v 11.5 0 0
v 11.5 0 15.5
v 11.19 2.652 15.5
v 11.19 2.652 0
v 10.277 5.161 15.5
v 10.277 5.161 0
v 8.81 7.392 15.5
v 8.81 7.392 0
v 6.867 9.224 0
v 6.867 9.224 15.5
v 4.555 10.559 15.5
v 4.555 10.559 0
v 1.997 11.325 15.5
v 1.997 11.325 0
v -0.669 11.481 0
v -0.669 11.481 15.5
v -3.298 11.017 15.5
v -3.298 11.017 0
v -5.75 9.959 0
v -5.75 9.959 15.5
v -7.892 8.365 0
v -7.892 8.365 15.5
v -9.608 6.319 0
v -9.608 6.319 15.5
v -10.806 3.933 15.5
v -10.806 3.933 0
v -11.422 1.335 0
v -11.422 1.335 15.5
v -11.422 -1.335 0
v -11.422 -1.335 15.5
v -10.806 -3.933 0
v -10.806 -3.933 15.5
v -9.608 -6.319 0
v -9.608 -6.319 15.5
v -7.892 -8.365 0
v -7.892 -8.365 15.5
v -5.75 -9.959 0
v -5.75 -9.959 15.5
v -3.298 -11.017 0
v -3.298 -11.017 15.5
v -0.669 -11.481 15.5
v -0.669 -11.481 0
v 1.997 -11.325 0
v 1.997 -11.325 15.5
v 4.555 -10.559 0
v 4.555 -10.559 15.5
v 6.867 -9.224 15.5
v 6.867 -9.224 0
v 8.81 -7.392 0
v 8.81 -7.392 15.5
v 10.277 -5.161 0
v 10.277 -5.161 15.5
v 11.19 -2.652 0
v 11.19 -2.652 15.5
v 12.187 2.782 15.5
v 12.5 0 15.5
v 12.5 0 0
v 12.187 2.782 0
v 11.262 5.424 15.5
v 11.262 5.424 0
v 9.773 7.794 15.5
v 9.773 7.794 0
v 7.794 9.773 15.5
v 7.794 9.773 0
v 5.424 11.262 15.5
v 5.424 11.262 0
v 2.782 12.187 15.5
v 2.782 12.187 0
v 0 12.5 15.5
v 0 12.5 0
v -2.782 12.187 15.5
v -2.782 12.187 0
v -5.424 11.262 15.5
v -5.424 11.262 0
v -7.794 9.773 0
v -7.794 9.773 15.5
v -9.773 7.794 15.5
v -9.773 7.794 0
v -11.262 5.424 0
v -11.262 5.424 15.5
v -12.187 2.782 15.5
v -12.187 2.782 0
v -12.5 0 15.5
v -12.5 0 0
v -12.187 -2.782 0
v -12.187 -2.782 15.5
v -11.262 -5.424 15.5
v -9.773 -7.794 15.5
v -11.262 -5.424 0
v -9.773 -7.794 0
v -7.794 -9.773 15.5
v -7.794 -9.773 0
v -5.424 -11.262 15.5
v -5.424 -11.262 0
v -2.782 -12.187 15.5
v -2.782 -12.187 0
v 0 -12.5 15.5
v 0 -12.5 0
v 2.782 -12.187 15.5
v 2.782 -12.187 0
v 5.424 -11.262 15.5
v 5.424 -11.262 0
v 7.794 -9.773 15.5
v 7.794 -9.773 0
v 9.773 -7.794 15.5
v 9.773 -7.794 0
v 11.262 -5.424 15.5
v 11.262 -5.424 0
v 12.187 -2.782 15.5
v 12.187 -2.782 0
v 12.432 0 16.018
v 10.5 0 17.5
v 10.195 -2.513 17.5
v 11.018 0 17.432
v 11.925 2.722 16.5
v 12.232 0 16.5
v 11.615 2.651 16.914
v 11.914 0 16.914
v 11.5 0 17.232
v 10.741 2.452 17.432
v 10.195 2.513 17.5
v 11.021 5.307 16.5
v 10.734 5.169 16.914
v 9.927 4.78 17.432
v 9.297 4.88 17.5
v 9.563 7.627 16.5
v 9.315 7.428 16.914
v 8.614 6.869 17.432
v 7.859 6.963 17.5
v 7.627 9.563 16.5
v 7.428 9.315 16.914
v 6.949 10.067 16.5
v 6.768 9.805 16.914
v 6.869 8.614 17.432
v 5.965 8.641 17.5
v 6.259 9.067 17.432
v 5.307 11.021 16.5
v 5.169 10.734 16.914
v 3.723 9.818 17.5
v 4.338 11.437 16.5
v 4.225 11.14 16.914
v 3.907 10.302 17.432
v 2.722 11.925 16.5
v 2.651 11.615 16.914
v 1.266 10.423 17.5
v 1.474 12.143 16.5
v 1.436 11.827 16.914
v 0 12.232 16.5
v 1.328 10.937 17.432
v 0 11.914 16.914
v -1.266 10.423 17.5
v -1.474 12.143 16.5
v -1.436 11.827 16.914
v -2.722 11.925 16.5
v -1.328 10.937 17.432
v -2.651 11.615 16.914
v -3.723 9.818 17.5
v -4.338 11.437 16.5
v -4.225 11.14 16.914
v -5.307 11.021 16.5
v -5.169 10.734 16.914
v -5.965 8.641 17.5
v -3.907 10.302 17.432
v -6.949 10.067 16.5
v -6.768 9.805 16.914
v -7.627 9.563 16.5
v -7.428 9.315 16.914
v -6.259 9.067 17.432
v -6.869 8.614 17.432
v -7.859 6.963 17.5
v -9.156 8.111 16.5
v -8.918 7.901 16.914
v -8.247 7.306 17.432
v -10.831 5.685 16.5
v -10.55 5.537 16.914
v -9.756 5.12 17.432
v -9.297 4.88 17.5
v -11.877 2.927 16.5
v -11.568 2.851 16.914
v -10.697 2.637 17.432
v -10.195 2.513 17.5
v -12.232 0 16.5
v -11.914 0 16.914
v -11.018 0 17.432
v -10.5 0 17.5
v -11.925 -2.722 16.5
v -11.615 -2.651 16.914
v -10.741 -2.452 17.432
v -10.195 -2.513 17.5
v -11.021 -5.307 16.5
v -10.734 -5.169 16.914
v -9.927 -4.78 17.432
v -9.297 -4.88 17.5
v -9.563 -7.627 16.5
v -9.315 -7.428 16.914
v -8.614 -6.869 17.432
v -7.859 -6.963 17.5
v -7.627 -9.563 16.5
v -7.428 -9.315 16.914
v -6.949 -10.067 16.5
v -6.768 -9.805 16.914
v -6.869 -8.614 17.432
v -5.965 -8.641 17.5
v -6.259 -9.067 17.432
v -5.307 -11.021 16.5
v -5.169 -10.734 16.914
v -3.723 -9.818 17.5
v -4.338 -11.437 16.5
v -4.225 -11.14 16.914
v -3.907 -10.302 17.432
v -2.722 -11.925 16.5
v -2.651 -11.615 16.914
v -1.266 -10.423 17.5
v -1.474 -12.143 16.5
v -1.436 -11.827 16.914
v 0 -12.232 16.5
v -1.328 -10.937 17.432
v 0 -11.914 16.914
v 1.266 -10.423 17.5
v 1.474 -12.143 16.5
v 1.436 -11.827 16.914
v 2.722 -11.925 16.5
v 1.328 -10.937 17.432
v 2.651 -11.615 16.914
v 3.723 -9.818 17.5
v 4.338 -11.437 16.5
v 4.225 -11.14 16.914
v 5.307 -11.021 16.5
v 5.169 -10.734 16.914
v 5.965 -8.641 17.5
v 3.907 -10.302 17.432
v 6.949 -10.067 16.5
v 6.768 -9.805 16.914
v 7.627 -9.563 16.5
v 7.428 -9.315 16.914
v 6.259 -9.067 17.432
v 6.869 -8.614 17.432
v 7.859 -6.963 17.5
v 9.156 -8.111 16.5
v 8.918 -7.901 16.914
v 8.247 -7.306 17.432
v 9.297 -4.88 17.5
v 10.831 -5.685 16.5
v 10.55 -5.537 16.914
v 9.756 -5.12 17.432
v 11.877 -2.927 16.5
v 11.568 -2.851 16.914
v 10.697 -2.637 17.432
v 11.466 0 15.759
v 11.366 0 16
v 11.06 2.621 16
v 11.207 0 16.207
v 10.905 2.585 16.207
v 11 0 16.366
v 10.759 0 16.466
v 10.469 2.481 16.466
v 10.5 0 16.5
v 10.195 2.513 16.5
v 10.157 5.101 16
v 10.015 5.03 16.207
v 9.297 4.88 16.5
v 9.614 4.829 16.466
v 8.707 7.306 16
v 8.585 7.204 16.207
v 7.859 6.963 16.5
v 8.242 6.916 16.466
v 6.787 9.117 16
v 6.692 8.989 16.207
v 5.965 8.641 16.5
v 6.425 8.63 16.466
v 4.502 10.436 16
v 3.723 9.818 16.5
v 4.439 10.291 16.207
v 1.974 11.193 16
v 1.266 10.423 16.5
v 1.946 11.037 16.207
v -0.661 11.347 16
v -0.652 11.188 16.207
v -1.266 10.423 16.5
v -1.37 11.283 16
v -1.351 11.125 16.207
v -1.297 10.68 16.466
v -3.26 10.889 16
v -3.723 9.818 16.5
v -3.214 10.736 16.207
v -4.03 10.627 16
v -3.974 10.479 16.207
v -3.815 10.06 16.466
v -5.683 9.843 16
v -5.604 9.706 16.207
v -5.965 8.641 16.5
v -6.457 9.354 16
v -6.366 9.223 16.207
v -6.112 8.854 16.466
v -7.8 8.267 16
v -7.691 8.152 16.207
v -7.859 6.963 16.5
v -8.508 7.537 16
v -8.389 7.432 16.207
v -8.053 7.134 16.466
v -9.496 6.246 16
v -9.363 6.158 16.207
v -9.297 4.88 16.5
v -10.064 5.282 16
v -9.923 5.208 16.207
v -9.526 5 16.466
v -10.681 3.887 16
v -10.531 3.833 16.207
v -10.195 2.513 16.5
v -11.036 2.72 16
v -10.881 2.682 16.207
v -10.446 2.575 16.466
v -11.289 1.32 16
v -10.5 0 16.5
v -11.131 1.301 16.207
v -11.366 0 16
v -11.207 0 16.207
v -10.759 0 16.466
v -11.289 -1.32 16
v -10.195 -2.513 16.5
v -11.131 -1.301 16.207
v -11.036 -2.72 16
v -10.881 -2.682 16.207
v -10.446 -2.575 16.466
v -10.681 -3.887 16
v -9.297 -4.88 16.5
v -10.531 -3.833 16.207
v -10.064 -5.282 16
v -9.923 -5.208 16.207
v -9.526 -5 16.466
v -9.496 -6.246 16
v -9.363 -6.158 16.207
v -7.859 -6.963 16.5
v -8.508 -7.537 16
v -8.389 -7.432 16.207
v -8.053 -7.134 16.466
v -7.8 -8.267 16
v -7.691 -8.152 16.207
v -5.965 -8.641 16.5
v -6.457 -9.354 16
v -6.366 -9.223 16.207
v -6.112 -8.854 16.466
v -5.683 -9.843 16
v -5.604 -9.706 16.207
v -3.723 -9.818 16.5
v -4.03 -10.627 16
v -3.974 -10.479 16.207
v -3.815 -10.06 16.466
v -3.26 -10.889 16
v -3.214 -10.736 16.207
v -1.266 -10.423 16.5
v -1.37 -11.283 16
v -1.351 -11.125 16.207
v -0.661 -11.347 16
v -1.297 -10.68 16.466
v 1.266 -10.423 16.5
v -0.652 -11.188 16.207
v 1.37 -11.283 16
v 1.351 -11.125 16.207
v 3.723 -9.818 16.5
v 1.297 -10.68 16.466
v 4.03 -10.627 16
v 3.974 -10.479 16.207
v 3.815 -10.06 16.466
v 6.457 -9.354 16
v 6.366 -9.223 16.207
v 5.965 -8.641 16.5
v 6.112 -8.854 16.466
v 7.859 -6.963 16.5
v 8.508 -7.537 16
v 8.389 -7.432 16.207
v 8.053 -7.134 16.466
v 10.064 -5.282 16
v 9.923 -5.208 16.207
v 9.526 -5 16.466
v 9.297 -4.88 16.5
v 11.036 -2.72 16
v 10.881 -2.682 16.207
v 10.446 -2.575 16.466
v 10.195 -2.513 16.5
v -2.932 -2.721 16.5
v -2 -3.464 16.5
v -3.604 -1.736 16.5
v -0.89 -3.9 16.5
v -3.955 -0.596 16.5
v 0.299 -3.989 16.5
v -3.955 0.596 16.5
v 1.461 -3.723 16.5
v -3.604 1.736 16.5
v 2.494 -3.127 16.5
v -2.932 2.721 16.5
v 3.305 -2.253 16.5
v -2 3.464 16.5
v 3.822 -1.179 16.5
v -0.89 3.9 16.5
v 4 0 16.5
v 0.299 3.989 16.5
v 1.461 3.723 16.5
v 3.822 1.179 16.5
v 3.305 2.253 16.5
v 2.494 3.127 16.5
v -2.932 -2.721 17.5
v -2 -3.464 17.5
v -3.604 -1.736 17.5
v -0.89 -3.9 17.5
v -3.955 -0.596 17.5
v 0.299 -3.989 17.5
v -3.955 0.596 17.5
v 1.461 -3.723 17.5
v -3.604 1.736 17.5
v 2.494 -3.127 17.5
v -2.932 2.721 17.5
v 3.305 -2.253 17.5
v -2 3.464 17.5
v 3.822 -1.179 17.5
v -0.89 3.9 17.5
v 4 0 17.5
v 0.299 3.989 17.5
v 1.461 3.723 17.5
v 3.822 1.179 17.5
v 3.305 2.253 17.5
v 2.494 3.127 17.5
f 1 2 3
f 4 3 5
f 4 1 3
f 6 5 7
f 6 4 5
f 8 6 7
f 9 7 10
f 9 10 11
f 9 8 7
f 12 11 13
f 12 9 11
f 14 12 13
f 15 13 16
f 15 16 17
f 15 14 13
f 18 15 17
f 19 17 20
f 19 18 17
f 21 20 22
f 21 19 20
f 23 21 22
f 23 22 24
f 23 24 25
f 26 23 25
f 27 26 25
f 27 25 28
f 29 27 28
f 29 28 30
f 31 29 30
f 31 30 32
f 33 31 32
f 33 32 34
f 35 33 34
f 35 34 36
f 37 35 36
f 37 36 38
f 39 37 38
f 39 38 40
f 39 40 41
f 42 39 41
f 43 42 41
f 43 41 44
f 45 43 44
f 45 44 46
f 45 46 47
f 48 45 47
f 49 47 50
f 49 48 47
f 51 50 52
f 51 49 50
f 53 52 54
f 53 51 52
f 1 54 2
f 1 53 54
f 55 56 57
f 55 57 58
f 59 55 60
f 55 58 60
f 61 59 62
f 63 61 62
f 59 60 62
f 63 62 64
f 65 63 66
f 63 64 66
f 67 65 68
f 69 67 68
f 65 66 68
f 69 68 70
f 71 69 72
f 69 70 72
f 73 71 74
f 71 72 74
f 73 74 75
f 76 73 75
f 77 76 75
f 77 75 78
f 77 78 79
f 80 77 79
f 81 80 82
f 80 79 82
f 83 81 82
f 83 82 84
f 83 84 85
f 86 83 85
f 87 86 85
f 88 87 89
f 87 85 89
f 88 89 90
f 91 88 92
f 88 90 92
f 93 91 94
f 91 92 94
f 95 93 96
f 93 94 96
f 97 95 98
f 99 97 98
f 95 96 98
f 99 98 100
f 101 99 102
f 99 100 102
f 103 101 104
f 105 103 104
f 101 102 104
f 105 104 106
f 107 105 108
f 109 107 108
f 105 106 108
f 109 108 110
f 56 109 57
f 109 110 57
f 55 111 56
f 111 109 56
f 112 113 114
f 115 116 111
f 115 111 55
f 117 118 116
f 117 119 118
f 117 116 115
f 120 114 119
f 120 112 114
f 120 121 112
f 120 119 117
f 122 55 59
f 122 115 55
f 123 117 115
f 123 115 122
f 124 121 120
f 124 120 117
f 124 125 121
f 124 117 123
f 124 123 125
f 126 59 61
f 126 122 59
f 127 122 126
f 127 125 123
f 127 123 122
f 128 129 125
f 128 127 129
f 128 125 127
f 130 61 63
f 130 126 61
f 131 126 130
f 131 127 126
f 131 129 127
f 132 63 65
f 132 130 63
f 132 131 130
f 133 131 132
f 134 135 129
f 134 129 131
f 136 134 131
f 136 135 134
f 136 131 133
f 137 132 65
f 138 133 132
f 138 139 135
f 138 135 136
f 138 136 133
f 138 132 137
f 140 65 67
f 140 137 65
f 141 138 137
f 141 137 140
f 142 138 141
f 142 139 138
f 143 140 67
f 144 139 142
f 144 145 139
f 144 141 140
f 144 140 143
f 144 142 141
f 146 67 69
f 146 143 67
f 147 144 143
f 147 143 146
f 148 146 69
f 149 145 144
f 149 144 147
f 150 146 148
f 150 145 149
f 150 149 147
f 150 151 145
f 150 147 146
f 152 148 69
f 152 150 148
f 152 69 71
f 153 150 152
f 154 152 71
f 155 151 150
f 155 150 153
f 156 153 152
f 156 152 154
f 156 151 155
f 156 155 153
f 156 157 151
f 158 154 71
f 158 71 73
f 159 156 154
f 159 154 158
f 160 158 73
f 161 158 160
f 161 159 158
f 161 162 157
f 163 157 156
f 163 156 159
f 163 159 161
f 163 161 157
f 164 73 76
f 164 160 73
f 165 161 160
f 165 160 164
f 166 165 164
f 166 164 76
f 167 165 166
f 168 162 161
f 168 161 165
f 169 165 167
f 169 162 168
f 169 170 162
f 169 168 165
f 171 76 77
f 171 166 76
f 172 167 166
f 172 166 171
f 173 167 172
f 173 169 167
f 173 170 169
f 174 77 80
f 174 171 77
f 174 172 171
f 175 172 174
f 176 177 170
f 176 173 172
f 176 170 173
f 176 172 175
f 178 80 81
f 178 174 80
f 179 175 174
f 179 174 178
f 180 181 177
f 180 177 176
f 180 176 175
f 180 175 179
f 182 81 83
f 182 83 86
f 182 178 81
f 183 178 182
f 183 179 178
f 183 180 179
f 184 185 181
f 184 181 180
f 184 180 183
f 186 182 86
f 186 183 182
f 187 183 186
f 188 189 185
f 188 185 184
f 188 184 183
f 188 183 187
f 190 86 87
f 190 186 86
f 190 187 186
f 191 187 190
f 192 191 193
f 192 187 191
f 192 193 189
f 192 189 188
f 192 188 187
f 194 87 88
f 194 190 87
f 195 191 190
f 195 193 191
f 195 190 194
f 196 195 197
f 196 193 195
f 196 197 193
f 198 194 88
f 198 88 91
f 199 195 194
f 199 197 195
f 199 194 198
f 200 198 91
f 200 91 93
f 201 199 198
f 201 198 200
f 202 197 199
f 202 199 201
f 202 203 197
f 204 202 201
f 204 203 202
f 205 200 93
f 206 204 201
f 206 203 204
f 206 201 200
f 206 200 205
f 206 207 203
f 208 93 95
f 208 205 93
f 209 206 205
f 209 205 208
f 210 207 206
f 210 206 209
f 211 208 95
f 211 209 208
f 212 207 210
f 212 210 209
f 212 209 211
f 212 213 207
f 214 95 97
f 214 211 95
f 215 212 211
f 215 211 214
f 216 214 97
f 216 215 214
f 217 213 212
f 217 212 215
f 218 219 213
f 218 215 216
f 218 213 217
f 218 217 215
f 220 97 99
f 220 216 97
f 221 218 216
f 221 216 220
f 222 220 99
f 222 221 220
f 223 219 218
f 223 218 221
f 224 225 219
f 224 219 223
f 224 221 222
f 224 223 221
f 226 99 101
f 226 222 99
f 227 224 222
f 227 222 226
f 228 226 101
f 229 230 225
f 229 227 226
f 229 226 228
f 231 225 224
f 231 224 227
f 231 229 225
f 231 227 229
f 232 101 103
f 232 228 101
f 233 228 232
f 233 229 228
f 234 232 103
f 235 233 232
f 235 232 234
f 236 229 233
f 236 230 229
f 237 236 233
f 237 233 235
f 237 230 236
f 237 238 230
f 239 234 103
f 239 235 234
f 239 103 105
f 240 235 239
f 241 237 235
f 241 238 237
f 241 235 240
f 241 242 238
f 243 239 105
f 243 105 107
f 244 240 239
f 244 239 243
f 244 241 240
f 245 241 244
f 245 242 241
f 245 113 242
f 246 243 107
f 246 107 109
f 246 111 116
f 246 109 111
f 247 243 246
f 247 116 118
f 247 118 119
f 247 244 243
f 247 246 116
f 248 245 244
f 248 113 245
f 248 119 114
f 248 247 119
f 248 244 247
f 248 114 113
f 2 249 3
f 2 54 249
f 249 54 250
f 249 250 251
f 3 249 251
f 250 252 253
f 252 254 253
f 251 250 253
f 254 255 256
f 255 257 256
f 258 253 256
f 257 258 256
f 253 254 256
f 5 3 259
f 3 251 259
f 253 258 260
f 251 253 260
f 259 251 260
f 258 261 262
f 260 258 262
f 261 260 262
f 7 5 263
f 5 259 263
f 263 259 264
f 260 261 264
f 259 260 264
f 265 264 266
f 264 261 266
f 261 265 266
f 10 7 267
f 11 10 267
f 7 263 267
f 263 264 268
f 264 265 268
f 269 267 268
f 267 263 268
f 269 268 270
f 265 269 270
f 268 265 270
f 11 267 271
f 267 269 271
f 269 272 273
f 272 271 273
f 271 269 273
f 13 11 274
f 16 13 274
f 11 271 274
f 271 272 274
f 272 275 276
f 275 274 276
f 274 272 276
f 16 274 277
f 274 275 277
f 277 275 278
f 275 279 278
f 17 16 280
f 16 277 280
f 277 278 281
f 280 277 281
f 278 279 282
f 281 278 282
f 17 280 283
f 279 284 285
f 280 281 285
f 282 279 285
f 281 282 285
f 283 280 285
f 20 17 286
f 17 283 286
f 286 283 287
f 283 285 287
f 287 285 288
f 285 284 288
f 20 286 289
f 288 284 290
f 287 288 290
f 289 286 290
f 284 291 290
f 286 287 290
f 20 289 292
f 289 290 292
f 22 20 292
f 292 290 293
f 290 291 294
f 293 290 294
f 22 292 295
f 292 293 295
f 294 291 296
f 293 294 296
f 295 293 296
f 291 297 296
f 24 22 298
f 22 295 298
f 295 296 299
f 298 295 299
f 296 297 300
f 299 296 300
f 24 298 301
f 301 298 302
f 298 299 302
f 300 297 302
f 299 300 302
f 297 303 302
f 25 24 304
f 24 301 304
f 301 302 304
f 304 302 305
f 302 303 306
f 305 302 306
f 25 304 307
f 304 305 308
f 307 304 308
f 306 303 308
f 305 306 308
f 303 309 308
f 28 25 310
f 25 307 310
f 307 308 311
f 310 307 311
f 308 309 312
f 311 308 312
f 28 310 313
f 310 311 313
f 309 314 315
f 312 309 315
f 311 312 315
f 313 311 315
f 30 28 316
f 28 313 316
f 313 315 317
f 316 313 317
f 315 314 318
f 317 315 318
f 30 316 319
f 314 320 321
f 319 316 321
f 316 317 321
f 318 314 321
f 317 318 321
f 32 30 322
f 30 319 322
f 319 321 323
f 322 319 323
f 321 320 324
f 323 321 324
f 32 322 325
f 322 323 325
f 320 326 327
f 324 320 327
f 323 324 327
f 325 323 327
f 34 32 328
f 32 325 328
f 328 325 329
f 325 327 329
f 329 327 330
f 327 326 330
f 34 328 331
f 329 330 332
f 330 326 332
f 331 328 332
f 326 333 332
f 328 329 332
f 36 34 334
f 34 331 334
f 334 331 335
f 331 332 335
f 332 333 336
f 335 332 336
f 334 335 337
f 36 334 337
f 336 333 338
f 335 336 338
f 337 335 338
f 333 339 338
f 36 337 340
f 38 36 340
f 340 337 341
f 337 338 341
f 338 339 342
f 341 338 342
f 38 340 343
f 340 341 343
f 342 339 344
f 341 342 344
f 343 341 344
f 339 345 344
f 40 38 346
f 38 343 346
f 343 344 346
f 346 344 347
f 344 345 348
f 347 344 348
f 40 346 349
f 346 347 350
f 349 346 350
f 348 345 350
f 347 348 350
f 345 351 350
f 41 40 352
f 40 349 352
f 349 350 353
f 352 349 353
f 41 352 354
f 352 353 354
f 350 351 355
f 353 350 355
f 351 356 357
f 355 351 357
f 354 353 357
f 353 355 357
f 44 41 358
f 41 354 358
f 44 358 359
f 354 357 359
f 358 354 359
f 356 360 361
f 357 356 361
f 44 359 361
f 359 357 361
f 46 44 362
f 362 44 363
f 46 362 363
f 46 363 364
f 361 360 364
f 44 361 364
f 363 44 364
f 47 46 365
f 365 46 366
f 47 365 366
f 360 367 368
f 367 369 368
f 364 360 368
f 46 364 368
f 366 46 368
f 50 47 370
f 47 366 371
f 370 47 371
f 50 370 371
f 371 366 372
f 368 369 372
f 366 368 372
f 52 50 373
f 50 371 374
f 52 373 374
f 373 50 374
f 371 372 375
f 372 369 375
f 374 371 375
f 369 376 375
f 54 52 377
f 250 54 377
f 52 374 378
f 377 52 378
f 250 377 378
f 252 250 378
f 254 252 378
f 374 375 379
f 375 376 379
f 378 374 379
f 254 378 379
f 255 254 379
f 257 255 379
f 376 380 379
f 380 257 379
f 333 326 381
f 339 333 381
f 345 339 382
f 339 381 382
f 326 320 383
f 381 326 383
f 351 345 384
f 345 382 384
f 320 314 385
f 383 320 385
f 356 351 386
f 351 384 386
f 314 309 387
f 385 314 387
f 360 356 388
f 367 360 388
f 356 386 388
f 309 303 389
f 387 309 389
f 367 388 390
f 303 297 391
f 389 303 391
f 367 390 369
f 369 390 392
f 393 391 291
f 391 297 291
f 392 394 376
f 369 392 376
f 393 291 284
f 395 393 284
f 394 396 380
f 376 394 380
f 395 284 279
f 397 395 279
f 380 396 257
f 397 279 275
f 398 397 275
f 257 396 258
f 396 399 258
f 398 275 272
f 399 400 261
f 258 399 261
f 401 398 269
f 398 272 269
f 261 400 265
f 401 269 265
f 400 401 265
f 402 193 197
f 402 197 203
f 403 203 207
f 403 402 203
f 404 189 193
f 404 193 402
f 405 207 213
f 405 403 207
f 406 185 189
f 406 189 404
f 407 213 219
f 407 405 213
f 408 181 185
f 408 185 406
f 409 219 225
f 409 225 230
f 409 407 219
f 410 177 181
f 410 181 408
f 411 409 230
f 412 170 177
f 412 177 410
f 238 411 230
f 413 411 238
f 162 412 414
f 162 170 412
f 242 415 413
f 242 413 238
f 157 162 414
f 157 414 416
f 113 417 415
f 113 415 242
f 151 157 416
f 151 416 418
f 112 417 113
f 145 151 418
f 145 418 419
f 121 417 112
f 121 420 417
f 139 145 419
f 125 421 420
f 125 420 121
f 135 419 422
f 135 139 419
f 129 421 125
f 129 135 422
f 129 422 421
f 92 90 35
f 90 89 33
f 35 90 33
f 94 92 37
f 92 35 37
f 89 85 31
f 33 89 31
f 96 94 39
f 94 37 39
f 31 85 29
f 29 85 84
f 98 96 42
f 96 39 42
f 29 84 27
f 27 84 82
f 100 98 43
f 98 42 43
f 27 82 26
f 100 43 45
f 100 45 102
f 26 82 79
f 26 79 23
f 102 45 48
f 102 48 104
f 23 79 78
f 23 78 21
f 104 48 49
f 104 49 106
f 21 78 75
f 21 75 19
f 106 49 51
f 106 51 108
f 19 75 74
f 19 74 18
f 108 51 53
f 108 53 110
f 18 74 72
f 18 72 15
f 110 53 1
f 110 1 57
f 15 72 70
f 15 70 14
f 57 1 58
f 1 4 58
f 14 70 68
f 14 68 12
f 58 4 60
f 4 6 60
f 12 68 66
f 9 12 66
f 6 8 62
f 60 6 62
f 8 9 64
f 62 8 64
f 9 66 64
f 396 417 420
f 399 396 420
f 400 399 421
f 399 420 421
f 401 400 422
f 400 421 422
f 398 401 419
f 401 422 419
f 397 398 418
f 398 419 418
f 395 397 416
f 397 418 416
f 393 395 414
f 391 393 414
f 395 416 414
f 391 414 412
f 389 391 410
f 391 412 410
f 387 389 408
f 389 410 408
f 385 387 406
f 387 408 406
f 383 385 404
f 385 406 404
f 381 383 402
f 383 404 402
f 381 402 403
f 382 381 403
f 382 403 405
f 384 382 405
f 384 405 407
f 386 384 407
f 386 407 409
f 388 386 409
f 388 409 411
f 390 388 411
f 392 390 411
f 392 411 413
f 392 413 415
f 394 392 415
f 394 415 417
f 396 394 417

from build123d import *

# Parameters (mm, degrees)
SKETCH8_R      = 12.5
EXTRUDE6_DEPTH = 17.5
FILLET2_R      = 2
SHELL1_T       = -1
SKETCH9_R      = 4
EXTRUDE7_DEPTH = 25.874685978


with BuildPart() as part:
    # Sketch8 → Extrude6 (new body)
    with BuildSketch(Plane.XY):
        Circle(SKETCH8_R)
    extrude(amount=EXTRUDE6_DEPTH)

    # Fillet2
    fillet2_edges = [part.edges().sort_by_distance(p)[0] for p in [
        (-12.5, 0, 17.5),
    ]]
    fillet(fillet2_edges, radius=FILLET2_R)

    # Shell1
    shell1_openings = [part.faces().sort_by_distance(p)[0] for p in [
        (0, 0, 0),
    ]]
    offset(amount=SHELL1_T, openings=shell1_openings, kind=Kind.INTERSECTION)

    # Sketch9 → Extrude7 (cut, through all)
    with BuildSketch(Plane.XY.offset(17.5)):
        Circle(SKETCH9_R)
    extrude(amount=-EXTRUDE7_DEPTH, mode=Mode.SUBTRACT)


solid = part.part
